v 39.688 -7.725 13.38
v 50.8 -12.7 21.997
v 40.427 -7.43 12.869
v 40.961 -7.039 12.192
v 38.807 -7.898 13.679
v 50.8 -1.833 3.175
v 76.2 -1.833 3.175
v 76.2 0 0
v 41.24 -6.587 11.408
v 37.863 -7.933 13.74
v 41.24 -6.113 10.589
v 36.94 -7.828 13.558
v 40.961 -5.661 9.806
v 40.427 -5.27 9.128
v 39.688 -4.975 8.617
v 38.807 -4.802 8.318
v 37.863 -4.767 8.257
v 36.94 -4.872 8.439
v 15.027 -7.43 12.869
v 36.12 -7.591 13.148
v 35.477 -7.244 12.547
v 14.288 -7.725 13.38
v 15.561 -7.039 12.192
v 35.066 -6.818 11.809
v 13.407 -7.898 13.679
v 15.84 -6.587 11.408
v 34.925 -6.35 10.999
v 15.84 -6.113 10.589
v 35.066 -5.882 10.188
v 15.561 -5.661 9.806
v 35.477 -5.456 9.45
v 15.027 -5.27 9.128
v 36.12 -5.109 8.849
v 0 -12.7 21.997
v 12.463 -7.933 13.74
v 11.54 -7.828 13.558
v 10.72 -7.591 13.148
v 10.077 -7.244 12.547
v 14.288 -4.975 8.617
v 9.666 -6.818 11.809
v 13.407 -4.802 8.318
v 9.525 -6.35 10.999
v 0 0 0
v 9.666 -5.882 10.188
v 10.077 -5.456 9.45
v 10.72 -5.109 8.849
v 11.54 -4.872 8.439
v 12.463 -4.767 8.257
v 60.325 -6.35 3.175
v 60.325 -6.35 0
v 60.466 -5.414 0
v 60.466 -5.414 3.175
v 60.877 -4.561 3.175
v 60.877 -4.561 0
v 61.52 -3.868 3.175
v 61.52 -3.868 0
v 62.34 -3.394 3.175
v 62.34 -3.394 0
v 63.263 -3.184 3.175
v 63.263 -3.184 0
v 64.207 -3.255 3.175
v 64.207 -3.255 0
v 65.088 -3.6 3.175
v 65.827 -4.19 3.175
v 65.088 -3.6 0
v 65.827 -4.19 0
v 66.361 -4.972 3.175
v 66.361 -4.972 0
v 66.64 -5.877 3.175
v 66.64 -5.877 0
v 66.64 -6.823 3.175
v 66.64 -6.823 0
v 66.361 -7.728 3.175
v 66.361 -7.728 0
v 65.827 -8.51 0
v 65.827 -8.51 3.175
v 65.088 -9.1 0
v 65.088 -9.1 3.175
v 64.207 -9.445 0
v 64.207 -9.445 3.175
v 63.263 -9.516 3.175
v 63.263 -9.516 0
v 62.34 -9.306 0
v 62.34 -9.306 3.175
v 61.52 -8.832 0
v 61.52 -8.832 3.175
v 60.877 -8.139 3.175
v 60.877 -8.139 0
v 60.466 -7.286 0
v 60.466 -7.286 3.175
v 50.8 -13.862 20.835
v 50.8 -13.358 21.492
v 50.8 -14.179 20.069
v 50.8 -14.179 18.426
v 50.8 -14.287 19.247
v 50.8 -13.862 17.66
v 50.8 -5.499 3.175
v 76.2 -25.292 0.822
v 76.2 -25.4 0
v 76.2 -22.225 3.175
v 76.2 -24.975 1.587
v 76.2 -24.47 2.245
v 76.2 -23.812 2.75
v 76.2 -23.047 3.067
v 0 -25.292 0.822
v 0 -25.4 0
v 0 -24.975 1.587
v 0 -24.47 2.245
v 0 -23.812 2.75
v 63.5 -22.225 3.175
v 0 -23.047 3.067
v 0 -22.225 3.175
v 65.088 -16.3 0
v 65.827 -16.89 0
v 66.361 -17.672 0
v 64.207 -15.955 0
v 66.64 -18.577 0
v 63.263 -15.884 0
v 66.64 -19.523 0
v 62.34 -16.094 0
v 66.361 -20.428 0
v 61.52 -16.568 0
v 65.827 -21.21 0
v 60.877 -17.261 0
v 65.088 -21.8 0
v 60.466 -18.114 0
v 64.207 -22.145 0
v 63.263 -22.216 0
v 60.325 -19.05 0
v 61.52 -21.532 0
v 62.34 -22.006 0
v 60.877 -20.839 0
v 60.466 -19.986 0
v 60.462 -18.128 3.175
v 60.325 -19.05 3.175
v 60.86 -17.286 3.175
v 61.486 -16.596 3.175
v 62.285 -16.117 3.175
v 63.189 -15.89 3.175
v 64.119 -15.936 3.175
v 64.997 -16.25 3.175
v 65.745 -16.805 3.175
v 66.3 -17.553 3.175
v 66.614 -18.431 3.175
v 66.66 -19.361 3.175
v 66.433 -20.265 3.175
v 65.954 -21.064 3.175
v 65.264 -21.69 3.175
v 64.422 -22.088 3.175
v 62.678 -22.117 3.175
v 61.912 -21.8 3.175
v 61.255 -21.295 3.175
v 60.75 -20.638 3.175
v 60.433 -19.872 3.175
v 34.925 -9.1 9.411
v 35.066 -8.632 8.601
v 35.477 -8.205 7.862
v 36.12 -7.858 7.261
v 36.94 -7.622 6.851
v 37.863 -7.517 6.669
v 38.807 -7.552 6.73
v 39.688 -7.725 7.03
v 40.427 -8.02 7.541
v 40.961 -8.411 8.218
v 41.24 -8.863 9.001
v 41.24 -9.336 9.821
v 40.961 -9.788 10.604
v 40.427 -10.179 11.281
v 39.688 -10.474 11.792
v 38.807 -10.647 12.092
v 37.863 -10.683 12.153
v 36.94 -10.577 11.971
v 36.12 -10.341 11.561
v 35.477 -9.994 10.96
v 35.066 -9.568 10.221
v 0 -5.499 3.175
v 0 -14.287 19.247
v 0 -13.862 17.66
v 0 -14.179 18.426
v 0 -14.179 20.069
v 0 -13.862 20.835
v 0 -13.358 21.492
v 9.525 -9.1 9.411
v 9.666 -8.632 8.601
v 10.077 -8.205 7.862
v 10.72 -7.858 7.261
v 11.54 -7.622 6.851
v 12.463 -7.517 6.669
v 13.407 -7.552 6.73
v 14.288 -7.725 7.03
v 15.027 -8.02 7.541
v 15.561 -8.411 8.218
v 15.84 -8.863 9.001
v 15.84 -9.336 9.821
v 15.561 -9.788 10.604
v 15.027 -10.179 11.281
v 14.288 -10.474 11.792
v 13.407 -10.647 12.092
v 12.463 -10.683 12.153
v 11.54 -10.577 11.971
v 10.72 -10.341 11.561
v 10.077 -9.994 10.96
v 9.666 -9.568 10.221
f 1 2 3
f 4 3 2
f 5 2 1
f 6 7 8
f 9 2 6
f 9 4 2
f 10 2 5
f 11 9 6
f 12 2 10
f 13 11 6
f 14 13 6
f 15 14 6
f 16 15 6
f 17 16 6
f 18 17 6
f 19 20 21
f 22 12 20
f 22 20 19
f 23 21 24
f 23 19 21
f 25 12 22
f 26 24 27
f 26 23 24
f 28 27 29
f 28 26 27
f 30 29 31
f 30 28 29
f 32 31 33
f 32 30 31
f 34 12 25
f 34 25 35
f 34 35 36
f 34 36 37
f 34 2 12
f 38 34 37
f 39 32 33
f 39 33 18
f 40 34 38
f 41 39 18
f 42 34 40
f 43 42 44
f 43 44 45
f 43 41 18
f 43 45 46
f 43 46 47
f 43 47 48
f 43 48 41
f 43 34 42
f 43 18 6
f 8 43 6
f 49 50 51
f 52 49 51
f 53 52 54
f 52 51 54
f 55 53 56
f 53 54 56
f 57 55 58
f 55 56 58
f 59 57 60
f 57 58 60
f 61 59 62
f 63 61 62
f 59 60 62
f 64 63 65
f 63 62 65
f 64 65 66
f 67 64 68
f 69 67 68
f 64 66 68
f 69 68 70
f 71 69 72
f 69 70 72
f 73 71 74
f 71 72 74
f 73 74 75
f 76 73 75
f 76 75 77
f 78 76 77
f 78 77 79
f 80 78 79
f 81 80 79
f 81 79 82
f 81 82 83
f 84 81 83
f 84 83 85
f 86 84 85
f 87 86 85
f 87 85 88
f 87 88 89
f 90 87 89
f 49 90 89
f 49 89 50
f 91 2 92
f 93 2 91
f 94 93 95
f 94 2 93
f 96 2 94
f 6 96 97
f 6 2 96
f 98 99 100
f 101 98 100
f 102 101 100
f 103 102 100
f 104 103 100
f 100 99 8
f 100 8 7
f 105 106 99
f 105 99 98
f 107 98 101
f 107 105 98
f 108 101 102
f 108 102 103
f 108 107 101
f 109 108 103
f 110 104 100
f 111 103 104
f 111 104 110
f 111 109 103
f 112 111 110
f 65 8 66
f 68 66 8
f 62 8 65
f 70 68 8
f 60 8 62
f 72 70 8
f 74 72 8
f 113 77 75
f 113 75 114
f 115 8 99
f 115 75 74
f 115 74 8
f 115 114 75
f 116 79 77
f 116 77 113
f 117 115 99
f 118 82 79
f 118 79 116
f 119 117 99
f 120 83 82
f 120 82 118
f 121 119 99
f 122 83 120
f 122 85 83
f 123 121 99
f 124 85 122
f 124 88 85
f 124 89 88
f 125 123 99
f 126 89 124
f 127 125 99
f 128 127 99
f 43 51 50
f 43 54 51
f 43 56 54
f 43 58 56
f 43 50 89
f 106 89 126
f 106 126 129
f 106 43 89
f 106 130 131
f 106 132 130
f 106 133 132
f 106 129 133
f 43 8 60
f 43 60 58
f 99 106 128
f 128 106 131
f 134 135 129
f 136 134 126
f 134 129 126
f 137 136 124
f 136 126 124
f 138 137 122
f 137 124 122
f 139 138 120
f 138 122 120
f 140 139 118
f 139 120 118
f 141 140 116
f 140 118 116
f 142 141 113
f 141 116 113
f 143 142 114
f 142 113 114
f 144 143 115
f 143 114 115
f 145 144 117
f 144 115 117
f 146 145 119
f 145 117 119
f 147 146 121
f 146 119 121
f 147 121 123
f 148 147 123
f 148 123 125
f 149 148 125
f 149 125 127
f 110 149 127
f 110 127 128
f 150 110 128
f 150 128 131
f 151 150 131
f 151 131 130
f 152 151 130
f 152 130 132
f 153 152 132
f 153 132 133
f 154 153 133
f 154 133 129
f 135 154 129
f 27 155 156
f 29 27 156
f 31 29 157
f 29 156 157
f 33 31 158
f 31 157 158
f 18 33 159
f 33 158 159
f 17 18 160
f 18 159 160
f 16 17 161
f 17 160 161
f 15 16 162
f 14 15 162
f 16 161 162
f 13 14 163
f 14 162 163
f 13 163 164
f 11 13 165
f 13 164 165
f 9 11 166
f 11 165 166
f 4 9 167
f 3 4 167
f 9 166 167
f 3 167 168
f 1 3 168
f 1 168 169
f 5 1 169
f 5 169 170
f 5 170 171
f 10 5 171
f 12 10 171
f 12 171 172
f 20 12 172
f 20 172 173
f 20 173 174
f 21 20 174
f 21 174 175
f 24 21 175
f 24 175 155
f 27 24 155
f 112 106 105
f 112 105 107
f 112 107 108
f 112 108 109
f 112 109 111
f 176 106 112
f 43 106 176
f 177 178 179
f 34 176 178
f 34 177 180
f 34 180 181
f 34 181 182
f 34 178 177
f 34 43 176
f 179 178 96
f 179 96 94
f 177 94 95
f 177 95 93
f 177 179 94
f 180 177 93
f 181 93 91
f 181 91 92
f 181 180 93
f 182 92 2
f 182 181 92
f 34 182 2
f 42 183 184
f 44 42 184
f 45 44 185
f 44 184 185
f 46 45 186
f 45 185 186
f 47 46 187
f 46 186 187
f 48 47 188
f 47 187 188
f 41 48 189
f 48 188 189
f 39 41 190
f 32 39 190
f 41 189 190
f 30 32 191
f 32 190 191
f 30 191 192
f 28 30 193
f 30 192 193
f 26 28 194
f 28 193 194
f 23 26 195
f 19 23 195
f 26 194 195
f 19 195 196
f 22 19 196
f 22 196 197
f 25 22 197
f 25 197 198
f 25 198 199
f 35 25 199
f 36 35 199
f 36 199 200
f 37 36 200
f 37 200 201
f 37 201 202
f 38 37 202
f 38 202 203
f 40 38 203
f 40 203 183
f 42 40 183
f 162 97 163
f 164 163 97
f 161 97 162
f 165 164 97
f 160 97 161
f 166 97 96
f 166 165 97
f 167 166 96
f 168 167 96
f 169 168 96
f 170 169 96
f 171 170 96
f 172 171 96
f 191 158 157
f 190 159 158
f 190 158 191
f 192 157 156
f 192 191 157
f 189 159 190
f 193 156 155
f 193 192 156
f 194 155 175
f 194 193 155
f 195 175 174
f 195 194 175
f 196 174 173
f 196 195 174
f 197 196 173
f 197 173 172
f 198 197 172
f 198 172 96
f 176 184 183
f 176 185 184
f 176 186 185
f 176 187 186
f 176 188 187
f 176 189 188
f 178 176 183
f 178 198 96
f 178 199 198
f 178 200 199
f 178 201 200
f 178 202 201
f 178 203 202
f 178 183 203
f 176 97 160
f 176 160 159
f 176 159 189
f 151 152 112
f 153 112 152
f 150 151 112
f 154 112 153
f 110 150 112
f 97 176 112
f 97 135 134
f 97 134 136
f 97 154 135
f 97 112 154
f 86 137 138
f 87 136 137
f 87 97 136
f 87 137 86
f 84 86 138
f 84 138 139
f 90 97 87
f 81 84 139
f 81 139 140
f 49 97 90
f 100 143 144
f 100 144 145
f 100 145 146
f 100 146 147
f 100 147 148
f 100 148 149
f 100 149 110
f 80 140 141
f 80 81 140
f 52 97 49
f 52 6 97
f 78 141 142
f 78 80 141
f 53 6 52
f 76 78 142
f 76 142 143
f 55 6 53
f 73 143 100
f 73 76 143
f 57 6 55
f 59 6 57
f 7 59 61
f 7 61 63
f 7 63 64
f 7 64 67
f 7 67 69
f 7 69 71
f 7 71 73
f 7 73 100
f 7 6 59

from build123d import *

# Parameters (mm, degrees)
BOSS_EXTRUDE1_DEPTH             = 76.2
CUT_EXTRUDE2_REACH              = 85.279
SKETCH3_W                       = 25.4
SKETCH3_H                       = 25.4
F_1_4_0_25_DIAMETER_HOLE1_D     = 6.35
F_1_4_0_25_DIAMETER_HOLE2_D     = 6.35
F_1_4_0_25_DIAMETER_HOLE2_DEPTH = 3.175


with BuildPart() as part:
    # Sketch1 → Boss-Extrude1 (new body)
    with BuildSketch(Plane(origin=(0, 0, 0), x_dir=(0, 0, -1), z_dir=(1, 0, 0))):
        with BuildLine():
            Line((0, 0), (0, -25.4))
            ThreePointArc((0, -25.4), (-2.24506403, -24.47006403), (-3.175, -22.225))
            Line((-3.175, -22.225), (-3.175, -5.499261314))
            Line((-3.175, -5.499261314), (-17.659914599, -13.862130657))
            ThreePointArc((-17.659914599, -13.862130657), (-20.069165067, -14.179314498), (-21.997045256, -12.7))
            Line((-21.997045256, -12.7), (0, 0))
        make_face()
    extrude(amount=BOSS_EXTRUDE1_DEPTH)

    # Sketch3 → Cut-Extrude2 (cut, up to next)
    with BuildSketch(Plane(origin=(0, 0, 0), x_dir=(1, 0, 0), z_dir=(0, 1, 0)), mode=Mode.PRIVATE) as cut_extrude2_sk1:
        with Locations((63.5, -15.875)):
            Rectangle(SKETCH3_W, SKETCH3_H)
    cut_extrude2_tool1 = extrude(cut_extrude2_sk1.sketch, amount=-CUT_EXTRUDE2_REACH, mode=Mode.PRIVATE) & part.part
    add(cut_extrude2_tool1.solids().sort_by_distance((63.5, 0, 15.875))[0], mode=Mode.SUBTRACT)

    # 1/4 (0.25) Diameter Hole1 (through all)
    with Locations(Plane.XY.offset(3.175)):
        with Locations((63.5, -6.35), (63.5, -19.05)):
            Hole(F_1_4_0_25_DIAMETER_HOLE1_D / 2)

    # 1/4 (0.25) Diameter Hole2
    with Locations(Plane(origin=(0, 0, 0), x_dir=(1, 0, 0), z_dir=(0, 0.8660254037844398, 0.49999999999999806))):
        with Locations((12.7, -12.7), (38.1, -12.7)):
            Hole(F_1_4_0_25_DIAMETER_HOLE2_D / 2, depth=F_1_4_0_25_DIAMETER_HOLE2_DEPTH)


solid = part.part
